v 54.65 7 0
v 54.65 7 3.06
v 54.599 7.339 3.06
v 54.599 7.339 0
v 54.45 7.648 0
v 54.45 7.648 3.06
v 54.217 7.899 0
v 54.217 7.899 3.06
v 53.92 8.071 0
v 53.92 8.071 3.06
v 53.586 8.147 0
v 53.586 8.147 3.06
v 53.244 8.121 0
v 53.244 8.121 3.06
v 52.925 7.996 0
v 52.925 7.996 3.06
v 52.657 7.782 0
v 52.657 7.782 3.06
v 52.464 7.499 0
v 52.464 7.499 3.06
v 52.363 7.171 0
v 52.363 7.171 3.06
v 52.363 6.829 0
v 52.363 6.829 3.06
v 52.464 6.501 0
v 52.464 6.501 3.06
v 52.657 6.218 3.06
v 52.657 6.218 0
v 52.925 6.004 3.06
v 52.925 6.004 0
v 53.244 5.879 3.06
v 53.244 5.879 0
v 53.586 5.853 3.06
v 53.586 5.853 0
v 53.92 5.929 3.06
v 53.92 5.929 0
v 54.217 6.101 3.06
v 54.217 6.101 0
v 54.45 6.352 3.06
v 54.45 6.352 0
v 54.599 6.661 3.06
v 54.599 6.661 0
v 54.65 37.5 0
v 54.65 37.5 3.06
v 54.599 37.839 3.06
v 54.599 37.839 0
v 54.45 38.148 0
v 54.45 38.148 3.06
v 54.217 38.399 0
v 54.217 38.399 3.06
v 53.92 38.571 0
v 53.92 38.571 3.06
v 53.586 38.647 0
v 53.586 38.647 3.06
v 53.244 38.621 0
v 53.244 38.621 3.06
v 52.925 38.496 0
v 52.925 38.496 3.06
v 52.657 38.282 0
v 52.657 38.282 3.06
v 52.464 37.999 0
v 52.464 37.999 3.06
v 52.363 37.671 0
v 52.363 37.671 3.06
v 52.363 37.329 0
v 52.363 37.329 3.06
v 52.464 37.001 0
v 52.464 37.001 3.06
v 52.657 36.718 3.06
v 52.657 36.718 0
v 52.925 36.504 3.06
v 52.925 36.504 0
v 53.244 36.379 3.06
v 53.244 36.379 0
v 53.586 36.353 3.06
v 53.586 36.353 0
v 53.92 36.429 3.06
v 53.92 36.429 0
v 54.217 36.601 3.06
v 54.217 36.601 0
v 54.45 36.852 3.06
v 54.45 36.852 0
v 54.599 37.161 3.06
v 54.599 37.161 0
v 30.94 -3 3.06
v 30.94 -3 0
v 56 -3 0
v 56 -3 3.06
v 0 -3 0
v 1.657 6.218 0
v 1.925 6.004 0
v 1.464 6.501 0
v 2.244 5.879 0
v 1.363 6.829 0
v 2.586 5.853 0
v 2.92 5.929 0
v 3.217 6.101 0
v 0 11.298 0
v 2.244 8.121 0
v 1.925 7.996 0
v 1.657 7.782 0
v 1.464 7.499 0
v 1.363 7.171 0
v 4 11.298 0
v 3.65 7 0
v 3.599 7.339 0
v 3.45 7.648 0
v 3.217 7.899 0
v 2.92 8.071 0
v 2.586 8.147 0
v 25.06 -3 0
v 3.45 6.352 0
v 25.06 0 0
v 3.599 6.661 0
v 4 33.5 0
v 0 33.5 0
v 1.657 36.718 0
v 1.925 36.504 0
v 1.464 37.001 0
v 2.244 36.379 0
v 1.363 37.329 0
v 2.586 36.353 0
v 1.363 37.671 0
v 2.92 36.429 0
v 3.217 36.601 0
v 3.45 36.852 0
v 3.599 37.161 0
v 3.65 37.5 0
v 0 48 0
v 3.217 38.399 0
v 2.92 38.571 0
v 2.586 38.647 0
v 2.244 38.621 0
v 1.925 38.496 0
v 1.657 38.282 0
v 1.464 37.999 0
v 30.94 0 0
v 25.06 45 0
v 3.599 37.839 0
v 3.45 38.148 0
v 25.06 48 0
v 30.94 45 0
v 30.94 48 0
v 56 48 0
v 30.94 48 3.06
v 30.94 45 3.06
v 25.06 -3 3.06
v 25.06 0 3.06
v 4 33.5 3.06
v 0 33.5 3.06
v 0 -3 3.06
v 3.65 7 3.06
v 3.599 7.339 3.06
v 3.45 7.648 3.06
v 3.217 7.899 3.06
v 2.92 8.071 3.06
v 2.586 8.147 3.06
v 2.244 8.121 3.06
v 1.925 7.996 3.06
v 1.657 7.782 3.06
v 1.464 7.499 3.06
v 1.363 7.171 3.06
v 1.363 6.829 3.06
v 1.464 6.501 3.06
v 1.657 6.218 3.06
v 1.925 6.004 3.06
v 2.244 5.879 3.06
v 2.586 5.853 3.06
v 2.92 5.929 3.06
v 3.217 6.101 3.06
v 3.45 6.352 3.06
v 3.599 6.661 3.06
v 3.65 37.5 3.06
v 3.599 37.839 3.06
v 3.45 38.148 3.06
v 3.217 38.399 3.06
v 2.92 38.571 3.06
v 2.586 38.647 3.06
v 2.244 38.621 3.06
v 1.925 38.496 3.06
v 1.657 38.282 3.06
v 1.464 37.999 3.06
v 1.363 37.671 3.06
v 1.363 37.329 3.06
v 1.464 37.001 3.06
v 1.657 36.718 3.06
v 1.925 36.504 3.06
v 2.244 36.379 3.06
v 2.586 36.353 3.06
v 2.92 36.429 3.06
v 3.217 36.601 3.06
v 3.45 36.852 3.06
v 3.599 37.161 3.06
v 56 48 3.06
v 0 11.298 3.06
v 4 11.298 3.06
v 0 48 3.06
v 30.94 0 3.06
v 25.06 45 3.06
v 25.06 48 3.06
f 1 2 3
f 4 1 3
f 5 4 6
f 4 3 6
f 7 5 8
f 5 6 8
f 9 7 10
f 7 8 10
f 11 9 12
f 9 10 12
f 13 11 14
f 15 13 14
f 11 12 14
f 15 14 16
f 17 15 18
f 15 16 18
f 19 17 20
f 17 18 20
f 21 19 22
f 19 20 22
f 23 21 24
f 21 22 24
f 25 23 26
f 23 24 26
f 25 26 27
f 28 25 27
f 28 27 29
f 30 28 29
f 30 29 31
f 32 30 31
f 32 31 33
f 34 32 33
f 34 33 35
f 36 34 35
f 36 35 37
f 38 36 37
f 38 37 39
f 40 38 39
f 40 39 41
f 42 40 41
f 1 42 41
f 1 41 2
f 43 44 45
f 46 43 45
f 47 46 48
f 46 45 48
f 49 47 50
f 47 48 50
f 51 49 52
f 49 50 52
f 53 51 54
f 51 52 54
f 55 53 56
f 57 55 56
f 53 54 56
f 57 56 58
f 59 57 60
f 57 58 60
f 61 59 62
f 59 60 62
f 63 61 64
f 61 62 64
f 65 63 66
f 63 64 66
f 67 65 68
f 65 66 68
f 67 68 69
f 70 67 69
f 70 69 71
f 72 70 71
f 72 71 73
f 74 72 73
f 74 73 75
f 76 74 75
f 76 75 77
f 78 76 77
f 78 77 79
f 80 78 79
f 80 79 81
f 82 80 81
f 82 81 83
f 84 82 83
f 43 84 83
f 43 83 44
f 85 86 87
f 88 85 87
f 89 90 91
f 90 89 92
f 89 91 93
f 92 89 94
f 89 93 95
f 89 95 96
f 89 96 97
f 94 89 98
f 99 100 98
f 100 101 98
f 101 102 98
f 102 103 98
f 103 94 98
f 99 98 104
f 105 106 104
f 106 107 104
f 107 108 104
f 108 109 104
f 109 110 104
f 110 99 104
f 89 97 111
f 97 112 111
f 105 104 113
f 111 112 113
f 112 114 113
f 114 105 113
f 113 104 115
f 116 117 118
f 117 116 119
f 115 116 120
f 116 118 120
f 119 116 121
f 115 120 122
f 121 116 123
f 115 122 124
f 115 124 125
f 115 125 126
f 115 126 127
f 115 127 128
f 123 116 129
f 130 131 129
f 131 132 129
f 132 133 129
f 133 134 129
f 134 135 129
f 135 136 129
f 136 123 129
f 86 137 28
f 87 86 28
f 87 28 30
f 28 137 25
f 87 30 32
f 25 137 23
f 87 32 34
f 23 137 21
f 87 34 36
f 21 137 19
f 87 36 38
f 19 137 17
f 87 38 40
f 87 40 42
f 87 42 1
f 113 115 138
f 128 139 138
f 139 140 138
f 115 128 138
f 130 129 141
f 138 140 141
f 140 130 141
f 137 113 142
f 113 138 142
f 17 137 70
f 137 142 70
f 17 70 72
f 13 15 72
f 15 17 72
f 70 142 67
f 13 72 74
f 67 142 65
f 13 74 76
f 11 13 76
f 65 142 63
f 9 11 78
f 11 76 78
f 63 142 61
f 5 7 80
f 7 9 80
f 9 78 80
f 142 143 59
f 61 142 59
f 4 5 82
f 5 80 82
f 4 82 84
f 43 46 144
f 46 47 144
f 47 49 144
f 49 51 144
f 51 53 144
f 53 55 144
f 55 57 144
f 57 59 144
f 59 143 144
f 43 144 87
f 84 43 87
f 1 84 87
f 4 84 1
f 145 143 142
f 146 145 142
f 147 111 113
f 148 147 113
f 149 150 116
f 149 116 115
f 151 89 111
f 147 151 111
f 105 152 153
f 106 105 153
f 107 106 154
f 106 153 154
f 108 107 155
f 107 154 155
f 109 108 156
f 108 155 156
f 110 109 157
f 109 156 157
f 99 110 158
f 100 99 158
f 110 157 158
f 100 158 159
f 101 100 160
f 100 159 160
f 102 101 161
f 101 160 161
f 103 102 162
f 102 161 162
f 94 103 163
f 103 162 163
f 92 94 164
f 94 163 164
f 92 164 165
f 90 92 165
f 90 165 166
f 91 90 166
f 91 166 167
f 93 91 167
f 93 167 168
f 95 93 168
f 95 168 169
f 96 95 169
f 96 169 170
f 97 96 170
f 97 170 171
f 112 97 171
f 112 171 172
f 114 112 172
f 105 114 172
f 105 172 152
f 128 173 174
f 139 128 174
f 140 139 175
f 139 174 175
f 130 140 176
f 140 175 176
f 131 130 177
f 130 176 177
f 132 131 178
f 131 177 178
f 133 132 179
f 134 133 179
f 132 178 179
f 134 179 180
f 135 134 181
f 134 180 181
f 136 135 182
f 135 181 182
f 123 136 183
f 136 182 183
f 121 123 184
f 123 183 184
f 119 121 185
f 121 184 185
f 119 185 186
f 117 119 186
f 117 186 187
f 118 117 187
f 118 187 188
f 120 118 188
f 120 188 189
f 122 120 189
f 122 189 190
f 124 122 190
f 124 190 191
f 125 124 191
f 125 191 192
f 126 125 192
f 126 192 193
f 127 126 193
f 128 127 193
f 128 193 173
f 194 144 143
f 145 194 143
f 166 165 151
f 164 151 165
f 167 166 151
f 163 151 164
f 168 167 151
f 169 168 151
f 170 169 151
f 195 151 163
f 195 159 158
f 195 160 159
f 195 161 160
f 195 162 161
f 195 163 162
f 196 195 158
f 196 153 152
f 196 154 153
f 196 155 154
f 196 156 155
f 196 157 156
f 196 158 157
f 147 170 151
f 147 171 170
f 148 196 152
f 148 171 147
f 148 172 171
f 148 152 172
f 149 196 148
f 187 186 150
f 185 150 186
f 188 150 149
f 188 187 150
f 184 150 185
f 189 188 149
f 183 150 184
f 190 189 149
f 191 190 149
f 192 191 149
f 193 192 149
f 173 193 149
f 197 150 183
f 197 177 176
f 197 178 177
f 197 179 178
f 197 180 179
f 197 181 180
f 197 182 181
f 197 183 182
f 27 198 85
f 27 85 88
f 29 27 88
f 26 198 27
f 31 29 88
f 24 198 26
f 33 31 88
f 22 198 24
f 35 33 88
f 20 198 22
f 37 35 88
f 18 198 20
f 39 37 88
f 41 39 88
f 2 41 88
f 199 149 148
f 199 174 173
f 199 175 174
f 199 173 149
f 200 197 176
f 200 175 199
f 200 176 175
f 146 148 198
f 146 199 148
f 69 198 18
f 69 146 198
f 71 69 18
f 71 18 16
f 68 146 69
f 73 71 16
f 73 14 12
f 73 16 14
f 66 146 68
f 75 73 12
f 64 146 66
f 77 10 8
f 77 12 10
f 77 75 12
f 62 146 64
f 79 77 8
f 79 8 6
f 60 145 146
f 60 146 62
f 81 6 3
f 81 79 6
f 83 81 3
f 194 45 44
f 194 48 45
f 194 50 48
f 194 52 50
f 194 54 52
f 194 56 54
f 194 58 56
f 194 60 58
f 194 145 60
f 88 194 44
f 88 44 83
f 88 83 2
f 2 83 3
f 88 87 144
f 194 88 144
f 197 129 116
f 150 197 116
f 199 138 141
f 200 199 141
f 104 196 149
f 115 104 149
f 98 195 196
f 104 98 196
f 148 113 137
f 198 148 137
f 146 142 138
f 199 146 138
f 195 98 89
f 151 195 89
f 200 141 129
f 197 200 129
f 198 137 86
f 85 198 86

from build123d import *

# Parameters (mm, degrees)
BOSS_EXTRUDE1_DEPTH = 3.06
SKETCH2_R           = 1.15
SKETCH2_W           = 4
SKETCH2_H           = 22.201866978
CUT_EXTRUDE1_DEPTH  = 74.819804931


with BuildPart() as part:
    # Sketch1 → Boss-Extrude1 (new body)
    with BuildSketch(Plane.XY):
        Polygon((25.06, 0), (30.94, 0), (30.94, -3), (56, -3), (56, 0), (56, 45), (56, 48), (30.94, 48), (30.94, 45), (25.06, 45), (25.06, 48), (0, 48), (0, 45), (0, 0), (0, -3), (25.06, -3), align=None)
    extrude(amount=BOSS_EXTRUDE1_DEPTH)

    # Sketch2 → Cut-Extrude1 (cut, through all)
    with BuildSketch(Plane.XY.offset(3.06)):
        with Locations((2.5, 37.5)):
            Circle(SKETCH2_R)
        with Locations((53.5, 37.5)):
            Circle(SKETCH2_R)
        with Locations((53.5, 7)):
            Circle(SKETCH2_R)
        with Locations((2.5, 7)):
            Circle(SKETCH2_R)
        with Locations((2, 22.399066511)):
            Rectangle(SKETCH2_W, SKETCH2_H)
    extrude(amount=-CUT_EXTRUDE1_DEPTH, mode=Mode.SUBTRACT)


solid = part.part
